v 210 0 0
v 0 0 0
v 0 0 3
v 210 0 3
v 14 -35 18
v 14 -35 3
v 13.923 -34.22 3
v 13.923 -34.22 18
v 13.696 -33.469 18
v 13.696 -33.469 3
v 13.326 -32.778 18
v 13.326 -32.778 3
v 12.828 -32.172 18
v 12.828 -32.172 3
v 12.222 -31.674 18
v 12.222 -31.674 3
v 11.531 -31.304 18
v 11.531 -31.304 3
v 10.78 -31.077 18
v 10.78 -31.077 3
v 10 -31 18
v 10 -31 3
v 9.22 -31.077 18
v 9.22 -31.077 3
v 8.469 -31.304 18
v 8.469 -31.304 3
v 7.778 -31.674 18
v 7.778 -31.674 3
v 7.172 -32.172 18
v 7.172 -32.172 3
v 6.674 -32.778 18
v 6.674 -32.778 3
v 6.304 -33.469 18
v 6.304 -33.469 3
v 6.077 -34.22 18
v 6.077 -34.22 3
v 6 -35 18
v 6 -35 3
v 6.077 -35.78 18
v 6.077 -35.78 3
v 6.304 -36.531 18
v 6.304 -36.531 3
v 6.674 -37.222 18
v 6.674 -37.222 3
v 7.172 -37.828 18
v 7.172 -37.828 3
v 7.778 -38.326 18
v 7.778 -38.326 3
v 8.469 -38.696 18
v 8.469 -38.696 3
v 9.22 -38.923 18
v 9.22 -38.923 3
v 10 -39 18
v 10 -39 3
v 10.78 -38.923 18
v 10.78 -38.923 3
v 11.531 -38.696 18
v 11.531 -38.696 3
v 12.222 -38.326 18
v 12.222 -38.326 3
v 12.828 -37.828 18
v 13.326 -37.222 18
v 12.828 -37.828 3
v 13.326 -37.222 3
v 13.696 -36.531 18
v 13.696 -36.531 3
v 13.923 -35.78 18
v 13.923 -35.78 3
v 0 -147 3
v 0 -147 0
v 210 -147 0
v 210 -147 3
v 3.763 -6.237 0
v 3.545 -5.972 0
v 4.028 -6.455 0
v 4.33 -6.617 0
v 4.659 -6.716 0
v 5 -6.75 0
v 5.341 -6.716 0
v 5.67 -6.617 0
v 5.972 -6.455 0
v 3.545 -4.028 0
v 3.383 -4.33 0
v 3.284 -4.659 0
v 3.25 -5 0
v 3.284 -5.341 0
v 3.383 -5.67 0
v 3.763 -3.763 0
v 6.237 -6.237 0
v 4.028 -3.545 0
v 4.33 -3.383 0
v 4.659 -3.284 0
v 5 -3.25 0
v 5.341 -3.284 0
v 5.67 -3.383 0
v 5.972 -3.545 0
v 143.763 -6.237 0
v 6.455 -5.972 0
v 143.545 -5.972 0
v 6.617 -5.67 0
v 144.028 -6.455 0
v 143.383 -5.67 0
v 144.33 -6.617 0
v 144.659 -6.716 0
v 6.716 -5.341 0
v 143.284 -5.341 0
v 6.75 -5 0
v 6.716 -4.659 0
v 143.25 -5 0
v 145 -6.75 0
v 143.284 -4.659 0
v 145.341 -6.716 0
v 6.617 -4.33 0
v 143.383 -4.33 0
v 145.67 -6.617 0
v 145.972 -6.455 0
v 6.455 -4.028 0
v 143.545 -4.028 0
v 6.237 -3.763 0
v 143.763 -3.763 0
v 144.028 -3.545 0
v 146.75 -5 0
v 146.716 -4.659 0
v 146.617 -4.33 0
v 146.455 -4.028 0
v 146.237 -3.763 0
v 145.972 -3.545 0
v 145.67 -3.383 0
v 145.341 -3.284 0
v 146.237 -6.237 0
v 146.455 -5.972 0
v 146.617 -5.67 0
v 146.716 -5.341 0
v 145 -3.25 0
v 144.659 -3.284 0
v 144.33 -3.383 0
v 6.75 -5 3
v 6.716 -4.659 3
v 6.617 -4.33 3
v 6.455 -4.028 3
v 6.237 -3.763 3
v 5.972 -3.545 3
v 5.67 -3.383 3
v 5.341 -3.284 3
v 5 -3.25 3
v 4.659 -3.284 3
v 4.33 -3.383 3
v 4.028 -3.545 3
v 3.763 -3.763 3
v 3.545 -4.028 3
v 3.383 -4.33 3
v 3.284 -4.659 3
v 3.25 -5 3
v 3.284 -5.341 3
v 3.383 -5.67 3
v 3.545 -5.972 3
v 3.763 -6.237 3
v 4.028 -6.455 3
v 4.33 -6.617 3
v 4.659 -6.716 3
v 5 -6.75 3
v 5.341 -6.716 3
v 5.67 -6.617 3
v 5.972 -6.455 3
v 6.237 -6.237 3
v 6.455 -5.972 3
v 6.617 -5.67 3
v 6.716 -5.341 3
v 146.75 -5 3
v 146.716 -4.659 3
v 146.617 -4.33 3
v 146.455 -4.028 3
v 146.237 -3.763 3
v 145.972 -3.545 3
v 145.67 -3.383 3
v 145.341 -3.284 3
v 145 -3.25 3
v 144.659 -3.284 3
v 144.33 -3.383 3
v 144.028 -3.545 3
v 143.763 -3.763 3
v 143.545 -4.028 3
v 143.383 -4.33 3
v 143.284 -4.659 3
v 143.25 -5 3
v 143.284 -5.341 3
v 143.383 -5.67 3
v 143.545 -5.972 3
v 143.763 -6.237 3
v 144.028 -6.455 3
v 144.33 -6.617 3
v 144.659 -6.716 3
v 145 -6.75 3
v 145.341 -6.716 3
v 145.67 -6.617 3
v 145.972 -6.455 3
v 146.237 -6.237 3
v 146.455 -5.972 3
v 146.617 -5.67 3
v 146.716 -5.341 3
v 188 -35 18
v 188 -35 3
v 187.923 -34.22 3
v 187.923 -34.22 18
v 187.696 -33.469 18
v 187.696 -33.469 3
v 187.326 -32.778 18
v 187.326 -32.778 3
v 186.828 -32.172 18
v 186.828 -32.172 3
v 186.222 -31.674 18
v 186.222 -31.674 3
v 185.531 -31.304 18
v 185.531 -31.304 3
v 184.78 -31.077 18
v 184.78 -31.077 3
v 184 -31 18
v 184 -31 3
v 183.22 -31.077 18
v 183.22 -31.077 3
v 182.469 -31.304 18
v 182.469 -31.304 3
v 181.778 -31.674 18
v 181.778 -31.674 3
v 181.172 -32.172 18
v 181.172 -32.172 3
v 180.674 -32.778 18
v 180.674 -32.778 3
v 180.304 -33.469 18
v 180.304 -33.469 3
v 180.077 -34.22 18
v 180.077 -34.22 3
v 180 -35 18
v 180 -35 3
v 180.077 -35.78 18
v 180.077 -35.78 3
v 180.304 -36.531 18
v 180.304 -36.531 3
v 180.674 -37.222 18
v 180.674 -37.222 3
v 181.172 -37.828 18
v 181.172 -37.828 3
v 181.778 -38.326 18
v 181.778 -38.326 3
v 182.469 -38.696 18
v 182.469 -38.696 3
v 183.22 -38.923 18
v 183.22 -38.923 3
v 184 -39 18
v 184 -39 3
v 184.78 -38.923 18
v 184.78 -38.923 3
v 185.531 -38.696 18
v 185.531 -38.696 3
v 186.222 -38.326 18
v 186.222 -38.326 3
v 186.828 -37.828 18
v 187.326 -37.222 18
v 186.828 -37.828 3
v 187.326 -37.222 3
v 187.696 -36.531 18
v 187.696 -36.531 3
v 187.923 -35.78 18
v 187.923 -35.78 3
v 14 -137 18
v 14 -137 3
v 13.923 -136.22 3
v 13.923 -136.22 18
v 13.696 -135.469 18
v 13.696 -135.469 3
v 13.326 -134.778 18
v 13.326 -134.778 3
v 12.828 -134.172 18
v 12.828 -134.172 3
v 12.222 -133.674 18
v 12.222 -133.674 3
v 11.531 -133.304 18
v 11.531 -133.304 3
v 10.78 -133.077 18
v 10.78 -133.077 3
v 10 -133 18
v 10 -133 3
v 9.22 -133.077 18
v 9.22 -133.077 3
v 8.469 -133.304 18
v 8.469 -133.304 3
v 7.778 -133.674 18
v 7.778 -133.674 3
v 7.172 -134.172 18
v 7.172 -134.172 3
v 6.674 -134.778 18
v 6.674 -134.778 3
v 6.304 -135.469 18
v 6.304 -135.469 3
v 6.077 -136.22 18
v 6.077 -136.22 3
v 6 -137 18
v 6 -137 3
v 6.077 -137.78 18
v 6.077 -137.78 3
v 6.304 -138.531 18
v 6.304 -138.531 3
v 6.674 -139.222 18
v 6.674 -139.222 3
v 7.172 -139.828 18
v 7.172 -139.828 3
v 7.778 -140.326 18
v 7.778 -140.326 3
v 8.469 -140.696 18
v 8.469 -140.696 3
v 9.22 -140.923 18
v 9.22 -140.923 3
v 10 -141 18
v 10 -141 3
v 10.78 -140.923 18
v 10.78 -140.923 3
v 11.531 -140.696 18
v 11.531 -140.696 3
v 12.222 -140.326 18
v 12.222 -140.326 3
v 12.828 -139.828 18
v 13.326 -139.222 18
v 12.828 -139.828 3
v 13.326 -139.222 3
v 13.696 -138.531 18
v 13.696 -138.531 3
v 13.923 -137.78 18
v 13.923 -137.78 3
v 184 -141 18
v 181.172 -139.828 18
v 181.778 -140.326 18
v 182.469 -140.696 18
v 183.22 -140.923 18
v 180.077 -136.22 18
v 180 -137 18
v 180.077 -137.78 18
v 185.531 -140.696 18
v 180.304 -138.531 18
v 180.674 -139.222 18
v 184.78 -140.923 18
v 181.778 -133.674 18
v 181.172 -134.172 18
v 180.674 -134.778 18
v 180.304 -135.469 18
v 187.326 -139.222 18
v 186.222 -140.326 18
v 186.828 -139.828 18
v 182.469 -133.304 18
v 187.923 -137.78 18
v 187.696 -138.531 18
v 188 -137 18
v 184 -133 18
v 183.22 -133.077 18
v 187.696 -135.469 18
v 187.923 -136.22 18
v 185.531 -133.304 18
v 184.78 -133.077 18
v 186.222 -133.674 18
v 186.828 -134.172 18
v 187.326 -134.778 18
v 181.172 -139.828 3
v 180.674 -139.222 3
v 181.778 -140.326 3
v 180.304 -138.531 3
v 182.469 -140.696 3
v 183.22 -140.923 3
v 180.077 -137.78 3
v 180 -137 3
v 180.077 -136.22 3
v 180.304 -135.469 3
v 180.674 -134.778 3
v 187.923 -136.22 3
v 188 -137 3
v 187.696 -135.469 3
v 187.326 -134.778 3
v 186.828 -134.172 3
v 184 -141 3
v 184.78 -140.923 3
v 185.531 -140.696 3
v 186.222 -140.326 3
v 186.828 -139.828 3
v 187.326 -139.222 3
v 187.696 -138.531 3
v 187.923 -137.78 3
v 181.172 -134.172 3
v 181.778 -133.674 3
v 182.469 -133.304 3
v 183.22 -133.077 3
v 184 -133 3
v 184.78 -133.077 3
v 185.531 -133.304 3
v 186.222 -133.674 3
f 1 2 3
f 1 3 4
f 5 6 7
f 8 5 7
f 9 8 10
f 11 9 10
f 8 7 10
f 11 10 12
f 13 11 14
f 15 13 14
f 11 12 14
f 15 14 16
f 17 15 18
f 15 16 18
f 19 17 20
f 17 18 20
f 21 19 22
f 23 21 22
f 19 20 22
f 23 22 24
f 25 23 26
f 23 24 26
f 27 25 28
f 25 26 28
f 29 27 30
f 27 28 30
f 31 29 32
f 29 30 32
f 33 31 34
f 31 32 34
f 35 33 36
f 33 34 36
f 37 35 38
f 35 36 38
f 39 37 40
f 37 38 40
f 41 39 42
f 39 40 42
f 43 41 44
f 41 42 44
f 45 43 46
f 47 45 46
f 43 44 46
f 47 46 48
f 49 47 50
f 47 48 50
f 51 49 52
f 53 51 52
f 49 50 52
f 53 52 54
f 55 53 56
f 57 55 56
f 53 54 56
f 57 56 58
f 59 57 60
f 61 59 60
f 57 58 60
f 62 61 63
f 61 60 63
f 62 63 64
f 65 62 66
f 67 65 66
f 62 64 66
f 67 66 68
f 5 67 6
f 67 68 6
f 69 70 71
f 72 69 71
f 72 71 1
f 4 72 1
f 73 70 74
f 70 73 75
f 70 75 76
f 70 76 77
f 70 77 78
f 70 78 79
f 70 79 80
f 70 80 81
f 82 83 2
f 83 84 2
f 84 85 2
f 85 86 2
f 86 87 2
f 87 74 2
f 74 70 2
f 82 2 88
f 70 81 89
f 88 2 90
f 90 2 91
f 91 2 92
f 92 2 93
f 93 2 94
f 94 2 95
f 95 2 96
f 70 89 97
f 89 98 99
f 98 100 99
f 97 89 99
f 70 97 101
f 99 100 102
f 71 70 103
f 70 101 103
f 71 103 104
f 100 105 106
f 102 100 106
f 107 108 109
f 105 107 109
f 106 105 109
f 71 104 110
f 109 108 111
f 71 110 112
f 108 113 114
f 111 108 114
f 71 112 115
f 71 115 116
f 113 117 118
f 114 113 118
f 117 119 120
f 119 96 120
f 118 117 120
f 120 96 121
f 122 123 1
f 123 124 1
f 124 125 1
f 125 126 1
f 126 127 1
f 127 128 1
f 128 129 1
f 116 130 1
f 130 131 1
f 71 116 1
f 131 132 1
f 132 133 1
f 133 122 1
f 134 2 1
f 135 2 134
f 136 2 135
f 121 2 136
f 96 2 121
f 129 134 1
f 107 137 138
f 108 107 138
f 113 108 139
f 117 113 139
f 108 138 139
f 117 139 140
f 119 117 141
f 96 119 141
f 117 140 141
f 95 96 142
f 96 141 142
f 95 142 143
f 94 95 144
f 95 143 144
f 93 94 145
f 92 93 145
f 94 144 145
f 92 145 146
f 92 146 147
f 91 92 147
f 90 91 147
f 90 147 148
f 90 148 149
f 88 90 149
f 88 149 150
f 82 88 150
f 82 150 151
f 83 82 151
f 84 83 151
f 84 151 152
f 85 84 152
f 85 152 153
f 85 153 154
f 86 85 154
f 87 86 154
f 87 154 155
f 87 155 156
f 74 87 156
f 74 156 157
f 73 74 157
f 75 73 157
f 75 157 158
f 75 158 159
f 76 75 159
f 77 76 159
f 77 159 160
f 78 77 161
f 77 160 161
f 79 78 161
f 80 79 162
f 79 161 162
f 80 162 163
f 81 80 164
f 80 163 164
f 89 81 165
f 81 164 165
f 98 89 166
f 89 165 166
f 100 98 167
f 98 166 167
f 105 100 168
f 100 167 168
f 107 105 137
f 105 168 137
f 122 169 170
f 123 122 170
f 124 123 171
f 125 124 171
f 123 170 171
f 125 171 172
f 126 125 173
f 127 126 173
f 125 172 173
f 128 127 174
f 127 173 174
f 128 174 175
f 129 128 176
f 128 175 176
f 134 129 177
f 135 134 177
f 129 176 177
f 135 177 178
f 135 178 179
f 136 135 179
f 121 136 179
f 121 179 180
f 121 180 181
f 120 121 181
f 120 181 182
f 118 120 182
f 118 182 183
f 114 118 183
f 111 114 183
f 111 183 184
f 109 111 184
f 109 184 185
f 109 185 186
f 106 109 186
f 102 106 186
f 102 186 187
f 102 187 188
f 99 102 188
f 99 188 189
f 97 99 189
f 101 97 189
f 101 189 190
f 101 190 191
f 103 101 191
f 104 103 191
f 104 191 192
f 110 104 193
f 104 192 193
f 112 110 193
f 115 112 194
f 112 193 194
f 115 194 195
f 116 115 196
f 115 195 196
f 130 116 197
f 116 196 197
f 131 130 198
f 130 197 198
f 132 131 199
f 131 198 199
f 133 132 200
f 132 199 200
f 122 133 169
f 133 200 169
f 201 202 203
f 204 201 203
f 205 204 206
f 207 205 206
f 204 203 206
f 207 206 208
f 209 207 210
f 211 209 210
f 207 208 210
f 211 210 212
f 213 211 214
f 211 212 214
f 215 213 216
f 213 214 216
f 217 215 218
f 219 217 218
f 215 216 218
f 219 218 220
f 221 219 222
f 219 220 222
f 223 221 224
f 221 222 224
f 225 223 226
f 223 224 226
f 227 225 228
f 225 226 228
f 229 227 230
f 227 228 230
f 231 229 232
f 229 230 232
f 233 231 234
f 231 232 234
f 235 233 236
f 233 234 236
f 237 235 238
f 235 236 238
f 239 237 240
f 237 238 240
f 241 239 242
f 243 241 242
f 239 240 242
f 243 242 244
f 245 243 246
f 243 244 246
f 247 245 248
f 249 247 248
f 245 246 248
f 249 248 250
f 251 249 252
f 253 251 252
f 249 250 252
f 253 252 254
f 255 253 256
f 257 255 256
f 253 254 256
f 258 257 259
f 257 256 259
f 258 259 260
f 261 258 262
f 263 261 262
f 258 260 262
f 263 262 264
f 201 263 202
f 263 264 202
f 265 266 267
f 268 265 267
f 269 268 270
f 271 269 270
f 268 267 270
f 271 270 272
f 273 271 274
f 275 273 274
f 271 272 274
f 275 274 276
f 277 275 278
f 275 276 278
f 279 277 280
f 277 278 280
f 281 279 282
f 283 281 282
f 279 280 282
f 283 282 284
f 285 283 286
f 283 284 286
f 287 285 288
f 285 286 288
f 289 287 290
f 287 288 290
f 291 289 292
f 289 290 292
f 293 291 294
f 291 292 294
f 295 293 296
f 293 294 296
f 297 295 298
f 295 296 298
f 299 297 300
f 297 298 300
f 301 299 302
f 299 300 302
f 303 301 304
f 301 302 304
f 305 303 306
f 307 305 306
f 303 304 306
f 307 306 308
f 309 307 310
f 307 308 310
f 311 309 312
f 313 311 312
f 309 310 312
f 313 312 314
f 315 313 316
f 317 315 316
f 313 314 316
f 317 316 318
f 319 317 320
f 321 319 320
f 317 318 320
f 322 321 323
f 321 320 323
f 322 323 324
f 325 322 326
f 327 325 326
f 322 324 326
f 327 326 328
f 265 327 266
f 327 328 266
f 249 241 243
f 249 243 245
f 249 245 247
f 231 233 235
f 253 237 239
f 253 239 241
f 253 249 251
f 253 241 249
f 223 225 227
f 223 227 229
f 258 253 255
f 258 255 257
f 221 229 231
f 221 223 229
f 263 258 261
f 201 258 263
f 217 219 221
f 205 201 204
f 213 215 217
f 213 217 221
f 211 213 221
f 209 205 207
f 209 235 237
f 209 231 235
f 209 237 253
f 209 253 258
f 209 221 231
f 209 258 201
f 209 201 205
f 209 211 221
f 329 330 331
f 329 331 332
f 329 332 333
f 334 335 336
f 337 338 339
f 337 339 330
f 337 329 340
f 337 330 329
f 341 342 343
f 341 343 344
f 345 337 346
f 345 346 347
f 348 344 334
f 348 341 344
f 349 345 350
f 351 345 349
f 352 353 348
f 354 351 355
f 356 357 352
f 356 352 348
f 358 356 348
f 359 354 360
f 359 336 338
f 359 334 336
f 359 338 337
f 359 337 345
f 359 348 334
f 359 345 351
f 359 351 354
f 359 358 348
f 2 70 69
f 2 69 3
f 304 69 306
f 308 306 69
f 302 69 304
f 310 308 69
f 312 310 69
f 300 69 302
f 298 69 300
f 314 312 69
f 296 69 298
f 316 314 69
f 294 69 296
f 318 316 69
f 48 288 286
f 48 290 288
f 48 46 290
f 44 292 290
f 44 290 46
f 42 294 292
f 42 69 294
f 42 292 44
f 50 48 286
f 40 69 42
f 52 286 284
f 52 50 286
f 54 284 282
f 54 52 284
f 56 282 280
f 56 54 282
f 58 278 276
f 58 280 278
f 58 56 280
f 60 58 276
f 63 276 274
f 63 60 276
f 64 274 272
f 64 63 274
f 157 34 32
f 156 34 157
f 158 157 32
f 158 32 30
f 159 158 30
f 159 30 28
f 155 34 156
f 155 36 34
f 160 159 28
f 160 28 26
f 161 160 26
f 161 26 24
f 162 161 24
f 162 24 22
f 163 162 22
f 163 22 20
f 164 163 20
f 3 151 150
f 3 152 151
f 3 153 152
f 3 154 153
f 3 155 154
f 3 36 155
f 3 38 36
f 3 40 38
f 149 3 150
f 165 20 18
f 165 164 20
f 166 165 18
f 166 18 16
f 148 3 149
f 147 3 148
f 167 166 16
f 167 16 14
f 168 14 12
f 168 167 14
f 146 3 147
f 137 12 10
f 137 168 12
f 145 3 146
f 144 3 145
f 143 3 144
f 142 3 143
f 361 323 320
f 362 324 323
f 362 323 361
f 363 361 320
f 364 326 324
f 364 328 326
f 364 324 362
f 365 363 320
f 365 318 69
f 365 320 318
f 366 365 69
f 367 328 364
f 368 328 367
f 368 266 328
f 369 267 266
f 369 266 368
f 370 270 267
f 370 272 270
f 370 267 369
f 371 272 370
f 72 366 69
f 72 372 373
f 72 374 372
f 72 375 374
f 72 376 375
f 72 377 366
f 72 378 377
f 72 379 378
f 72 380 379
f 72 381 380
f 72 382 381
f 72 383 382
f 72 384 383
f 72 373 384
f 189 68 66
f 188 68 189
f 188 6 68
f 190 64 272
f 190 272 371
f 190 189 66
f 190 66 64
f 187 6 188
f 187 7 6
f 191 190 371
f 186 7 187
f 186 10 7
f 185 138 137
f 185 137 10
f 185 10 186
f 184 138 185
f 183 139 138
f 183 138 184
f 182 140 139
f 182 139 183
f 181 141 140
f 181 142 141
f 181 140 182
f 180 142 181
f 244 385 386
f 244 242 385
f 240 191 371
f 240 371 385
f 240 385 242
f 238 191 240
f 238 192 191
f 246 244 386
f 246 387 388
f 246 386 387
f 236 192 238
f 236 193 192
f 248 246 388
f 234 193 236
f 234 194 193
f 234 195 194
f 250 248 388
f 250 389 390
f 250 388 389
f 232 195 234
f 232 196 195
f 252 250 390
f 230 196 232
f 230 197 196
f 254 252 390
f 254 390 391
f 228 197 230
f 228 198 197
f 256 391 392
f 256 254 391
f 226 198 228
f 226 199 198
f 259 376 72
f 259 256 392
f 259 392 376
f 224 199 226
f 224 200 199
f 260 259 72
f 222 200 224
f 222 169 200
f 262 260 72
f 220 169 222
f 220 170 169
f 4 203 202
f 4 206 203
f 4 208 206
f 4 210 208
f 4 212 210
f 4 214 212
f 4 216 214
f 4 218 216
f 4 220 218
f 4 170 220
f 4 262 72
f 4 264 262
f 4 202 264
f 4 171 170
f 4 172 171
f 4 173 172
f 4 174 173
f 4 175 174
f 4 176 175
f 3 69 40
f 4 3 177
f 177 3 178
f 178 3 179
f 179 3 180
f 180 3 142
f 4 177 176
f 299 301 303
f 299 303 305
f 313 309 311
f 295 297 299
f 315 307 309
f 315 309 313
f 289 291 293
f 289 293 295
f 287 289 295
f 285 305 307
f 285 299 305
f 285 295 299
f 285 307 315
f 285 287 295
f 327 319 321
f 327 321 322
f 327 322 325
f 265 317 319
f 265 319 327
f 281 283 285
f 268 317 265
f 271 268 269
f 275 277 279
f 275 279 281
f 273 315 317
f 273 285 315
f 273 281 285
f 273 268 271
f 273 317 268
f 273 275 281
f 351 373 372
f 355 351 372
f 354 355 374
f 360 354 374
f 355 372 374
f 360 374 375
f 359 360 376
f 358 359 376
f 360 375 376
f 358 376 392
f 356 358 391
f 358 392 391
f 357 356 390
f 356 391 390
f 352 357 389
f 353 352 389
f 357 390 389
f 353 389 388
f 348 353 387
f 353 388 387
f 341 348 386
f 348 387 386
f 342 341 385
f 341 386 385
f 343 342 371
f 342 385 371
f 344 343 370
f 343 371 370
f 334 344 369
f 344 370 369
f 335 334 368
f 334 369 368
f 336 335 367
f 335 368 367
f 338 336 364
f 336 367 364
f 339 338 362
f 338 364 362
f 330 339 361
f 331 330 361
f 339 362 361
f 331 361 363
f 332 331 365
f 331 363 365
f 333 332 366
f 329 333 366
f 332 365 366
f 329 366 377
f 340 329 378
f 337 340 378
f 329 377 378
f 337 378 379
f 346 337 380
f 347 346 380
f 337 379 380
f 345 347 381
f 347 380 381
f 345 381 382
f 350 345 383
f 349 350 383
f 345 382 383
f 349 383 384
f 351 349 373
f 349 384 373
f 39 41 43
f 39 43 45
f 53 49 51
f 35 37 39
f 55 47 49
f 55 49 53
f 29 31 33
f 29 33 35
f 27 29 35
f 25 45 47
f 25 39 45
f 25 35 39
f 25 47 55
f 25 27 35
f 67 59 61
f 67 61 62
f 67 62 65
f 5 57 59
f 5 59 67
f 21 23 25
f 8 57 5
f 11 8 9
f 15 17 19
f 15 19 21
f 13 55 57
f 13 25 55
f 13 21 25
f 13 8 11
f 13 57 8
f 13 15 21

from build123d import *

# Parameters (mm, degrees)
F0_W     = 210
F0_H     = 147
F1_DEPTH = 3
F2_R     = 4
F3_DEPTH = 15
F4_R     = 1.75
F5_DEPTH = 25


with BuildPart() as f1:
    # F0 (on Top) → F1 (new body)
    with BuildSketch(Plane.XY):
        with Locations((105, -73.5)):
            Rectangle(F0_W, F0_H)
    extrude(amount=F1_DEPTH)

    # F2 (on face) → F3 (join)
    with BuildSketch(Plane.XY.offset(3)):
        with Locations((10, -35)):
            Circle(F2_R)
        with Locations((184, -35)):
            Circle(F2_R)
        with Locations((184, -137)):
            Circle(F2_R)
        with Locations((10, -137)):
            Circle(F2_R)
    extrude(amount=F3_DEPTH)

    # F4 (on face) → F5 (cut)
    with BuildSketch(Plane.XY.offset(3)):
        with Locations((5, -5)):
            Circle(F4_R)
        with Locations((145, -5)):
            Circle(F4_R)
    extrude(amount=-F5_DEPTH, mode=Mode.SUBTRACT)


solid = f1.part
